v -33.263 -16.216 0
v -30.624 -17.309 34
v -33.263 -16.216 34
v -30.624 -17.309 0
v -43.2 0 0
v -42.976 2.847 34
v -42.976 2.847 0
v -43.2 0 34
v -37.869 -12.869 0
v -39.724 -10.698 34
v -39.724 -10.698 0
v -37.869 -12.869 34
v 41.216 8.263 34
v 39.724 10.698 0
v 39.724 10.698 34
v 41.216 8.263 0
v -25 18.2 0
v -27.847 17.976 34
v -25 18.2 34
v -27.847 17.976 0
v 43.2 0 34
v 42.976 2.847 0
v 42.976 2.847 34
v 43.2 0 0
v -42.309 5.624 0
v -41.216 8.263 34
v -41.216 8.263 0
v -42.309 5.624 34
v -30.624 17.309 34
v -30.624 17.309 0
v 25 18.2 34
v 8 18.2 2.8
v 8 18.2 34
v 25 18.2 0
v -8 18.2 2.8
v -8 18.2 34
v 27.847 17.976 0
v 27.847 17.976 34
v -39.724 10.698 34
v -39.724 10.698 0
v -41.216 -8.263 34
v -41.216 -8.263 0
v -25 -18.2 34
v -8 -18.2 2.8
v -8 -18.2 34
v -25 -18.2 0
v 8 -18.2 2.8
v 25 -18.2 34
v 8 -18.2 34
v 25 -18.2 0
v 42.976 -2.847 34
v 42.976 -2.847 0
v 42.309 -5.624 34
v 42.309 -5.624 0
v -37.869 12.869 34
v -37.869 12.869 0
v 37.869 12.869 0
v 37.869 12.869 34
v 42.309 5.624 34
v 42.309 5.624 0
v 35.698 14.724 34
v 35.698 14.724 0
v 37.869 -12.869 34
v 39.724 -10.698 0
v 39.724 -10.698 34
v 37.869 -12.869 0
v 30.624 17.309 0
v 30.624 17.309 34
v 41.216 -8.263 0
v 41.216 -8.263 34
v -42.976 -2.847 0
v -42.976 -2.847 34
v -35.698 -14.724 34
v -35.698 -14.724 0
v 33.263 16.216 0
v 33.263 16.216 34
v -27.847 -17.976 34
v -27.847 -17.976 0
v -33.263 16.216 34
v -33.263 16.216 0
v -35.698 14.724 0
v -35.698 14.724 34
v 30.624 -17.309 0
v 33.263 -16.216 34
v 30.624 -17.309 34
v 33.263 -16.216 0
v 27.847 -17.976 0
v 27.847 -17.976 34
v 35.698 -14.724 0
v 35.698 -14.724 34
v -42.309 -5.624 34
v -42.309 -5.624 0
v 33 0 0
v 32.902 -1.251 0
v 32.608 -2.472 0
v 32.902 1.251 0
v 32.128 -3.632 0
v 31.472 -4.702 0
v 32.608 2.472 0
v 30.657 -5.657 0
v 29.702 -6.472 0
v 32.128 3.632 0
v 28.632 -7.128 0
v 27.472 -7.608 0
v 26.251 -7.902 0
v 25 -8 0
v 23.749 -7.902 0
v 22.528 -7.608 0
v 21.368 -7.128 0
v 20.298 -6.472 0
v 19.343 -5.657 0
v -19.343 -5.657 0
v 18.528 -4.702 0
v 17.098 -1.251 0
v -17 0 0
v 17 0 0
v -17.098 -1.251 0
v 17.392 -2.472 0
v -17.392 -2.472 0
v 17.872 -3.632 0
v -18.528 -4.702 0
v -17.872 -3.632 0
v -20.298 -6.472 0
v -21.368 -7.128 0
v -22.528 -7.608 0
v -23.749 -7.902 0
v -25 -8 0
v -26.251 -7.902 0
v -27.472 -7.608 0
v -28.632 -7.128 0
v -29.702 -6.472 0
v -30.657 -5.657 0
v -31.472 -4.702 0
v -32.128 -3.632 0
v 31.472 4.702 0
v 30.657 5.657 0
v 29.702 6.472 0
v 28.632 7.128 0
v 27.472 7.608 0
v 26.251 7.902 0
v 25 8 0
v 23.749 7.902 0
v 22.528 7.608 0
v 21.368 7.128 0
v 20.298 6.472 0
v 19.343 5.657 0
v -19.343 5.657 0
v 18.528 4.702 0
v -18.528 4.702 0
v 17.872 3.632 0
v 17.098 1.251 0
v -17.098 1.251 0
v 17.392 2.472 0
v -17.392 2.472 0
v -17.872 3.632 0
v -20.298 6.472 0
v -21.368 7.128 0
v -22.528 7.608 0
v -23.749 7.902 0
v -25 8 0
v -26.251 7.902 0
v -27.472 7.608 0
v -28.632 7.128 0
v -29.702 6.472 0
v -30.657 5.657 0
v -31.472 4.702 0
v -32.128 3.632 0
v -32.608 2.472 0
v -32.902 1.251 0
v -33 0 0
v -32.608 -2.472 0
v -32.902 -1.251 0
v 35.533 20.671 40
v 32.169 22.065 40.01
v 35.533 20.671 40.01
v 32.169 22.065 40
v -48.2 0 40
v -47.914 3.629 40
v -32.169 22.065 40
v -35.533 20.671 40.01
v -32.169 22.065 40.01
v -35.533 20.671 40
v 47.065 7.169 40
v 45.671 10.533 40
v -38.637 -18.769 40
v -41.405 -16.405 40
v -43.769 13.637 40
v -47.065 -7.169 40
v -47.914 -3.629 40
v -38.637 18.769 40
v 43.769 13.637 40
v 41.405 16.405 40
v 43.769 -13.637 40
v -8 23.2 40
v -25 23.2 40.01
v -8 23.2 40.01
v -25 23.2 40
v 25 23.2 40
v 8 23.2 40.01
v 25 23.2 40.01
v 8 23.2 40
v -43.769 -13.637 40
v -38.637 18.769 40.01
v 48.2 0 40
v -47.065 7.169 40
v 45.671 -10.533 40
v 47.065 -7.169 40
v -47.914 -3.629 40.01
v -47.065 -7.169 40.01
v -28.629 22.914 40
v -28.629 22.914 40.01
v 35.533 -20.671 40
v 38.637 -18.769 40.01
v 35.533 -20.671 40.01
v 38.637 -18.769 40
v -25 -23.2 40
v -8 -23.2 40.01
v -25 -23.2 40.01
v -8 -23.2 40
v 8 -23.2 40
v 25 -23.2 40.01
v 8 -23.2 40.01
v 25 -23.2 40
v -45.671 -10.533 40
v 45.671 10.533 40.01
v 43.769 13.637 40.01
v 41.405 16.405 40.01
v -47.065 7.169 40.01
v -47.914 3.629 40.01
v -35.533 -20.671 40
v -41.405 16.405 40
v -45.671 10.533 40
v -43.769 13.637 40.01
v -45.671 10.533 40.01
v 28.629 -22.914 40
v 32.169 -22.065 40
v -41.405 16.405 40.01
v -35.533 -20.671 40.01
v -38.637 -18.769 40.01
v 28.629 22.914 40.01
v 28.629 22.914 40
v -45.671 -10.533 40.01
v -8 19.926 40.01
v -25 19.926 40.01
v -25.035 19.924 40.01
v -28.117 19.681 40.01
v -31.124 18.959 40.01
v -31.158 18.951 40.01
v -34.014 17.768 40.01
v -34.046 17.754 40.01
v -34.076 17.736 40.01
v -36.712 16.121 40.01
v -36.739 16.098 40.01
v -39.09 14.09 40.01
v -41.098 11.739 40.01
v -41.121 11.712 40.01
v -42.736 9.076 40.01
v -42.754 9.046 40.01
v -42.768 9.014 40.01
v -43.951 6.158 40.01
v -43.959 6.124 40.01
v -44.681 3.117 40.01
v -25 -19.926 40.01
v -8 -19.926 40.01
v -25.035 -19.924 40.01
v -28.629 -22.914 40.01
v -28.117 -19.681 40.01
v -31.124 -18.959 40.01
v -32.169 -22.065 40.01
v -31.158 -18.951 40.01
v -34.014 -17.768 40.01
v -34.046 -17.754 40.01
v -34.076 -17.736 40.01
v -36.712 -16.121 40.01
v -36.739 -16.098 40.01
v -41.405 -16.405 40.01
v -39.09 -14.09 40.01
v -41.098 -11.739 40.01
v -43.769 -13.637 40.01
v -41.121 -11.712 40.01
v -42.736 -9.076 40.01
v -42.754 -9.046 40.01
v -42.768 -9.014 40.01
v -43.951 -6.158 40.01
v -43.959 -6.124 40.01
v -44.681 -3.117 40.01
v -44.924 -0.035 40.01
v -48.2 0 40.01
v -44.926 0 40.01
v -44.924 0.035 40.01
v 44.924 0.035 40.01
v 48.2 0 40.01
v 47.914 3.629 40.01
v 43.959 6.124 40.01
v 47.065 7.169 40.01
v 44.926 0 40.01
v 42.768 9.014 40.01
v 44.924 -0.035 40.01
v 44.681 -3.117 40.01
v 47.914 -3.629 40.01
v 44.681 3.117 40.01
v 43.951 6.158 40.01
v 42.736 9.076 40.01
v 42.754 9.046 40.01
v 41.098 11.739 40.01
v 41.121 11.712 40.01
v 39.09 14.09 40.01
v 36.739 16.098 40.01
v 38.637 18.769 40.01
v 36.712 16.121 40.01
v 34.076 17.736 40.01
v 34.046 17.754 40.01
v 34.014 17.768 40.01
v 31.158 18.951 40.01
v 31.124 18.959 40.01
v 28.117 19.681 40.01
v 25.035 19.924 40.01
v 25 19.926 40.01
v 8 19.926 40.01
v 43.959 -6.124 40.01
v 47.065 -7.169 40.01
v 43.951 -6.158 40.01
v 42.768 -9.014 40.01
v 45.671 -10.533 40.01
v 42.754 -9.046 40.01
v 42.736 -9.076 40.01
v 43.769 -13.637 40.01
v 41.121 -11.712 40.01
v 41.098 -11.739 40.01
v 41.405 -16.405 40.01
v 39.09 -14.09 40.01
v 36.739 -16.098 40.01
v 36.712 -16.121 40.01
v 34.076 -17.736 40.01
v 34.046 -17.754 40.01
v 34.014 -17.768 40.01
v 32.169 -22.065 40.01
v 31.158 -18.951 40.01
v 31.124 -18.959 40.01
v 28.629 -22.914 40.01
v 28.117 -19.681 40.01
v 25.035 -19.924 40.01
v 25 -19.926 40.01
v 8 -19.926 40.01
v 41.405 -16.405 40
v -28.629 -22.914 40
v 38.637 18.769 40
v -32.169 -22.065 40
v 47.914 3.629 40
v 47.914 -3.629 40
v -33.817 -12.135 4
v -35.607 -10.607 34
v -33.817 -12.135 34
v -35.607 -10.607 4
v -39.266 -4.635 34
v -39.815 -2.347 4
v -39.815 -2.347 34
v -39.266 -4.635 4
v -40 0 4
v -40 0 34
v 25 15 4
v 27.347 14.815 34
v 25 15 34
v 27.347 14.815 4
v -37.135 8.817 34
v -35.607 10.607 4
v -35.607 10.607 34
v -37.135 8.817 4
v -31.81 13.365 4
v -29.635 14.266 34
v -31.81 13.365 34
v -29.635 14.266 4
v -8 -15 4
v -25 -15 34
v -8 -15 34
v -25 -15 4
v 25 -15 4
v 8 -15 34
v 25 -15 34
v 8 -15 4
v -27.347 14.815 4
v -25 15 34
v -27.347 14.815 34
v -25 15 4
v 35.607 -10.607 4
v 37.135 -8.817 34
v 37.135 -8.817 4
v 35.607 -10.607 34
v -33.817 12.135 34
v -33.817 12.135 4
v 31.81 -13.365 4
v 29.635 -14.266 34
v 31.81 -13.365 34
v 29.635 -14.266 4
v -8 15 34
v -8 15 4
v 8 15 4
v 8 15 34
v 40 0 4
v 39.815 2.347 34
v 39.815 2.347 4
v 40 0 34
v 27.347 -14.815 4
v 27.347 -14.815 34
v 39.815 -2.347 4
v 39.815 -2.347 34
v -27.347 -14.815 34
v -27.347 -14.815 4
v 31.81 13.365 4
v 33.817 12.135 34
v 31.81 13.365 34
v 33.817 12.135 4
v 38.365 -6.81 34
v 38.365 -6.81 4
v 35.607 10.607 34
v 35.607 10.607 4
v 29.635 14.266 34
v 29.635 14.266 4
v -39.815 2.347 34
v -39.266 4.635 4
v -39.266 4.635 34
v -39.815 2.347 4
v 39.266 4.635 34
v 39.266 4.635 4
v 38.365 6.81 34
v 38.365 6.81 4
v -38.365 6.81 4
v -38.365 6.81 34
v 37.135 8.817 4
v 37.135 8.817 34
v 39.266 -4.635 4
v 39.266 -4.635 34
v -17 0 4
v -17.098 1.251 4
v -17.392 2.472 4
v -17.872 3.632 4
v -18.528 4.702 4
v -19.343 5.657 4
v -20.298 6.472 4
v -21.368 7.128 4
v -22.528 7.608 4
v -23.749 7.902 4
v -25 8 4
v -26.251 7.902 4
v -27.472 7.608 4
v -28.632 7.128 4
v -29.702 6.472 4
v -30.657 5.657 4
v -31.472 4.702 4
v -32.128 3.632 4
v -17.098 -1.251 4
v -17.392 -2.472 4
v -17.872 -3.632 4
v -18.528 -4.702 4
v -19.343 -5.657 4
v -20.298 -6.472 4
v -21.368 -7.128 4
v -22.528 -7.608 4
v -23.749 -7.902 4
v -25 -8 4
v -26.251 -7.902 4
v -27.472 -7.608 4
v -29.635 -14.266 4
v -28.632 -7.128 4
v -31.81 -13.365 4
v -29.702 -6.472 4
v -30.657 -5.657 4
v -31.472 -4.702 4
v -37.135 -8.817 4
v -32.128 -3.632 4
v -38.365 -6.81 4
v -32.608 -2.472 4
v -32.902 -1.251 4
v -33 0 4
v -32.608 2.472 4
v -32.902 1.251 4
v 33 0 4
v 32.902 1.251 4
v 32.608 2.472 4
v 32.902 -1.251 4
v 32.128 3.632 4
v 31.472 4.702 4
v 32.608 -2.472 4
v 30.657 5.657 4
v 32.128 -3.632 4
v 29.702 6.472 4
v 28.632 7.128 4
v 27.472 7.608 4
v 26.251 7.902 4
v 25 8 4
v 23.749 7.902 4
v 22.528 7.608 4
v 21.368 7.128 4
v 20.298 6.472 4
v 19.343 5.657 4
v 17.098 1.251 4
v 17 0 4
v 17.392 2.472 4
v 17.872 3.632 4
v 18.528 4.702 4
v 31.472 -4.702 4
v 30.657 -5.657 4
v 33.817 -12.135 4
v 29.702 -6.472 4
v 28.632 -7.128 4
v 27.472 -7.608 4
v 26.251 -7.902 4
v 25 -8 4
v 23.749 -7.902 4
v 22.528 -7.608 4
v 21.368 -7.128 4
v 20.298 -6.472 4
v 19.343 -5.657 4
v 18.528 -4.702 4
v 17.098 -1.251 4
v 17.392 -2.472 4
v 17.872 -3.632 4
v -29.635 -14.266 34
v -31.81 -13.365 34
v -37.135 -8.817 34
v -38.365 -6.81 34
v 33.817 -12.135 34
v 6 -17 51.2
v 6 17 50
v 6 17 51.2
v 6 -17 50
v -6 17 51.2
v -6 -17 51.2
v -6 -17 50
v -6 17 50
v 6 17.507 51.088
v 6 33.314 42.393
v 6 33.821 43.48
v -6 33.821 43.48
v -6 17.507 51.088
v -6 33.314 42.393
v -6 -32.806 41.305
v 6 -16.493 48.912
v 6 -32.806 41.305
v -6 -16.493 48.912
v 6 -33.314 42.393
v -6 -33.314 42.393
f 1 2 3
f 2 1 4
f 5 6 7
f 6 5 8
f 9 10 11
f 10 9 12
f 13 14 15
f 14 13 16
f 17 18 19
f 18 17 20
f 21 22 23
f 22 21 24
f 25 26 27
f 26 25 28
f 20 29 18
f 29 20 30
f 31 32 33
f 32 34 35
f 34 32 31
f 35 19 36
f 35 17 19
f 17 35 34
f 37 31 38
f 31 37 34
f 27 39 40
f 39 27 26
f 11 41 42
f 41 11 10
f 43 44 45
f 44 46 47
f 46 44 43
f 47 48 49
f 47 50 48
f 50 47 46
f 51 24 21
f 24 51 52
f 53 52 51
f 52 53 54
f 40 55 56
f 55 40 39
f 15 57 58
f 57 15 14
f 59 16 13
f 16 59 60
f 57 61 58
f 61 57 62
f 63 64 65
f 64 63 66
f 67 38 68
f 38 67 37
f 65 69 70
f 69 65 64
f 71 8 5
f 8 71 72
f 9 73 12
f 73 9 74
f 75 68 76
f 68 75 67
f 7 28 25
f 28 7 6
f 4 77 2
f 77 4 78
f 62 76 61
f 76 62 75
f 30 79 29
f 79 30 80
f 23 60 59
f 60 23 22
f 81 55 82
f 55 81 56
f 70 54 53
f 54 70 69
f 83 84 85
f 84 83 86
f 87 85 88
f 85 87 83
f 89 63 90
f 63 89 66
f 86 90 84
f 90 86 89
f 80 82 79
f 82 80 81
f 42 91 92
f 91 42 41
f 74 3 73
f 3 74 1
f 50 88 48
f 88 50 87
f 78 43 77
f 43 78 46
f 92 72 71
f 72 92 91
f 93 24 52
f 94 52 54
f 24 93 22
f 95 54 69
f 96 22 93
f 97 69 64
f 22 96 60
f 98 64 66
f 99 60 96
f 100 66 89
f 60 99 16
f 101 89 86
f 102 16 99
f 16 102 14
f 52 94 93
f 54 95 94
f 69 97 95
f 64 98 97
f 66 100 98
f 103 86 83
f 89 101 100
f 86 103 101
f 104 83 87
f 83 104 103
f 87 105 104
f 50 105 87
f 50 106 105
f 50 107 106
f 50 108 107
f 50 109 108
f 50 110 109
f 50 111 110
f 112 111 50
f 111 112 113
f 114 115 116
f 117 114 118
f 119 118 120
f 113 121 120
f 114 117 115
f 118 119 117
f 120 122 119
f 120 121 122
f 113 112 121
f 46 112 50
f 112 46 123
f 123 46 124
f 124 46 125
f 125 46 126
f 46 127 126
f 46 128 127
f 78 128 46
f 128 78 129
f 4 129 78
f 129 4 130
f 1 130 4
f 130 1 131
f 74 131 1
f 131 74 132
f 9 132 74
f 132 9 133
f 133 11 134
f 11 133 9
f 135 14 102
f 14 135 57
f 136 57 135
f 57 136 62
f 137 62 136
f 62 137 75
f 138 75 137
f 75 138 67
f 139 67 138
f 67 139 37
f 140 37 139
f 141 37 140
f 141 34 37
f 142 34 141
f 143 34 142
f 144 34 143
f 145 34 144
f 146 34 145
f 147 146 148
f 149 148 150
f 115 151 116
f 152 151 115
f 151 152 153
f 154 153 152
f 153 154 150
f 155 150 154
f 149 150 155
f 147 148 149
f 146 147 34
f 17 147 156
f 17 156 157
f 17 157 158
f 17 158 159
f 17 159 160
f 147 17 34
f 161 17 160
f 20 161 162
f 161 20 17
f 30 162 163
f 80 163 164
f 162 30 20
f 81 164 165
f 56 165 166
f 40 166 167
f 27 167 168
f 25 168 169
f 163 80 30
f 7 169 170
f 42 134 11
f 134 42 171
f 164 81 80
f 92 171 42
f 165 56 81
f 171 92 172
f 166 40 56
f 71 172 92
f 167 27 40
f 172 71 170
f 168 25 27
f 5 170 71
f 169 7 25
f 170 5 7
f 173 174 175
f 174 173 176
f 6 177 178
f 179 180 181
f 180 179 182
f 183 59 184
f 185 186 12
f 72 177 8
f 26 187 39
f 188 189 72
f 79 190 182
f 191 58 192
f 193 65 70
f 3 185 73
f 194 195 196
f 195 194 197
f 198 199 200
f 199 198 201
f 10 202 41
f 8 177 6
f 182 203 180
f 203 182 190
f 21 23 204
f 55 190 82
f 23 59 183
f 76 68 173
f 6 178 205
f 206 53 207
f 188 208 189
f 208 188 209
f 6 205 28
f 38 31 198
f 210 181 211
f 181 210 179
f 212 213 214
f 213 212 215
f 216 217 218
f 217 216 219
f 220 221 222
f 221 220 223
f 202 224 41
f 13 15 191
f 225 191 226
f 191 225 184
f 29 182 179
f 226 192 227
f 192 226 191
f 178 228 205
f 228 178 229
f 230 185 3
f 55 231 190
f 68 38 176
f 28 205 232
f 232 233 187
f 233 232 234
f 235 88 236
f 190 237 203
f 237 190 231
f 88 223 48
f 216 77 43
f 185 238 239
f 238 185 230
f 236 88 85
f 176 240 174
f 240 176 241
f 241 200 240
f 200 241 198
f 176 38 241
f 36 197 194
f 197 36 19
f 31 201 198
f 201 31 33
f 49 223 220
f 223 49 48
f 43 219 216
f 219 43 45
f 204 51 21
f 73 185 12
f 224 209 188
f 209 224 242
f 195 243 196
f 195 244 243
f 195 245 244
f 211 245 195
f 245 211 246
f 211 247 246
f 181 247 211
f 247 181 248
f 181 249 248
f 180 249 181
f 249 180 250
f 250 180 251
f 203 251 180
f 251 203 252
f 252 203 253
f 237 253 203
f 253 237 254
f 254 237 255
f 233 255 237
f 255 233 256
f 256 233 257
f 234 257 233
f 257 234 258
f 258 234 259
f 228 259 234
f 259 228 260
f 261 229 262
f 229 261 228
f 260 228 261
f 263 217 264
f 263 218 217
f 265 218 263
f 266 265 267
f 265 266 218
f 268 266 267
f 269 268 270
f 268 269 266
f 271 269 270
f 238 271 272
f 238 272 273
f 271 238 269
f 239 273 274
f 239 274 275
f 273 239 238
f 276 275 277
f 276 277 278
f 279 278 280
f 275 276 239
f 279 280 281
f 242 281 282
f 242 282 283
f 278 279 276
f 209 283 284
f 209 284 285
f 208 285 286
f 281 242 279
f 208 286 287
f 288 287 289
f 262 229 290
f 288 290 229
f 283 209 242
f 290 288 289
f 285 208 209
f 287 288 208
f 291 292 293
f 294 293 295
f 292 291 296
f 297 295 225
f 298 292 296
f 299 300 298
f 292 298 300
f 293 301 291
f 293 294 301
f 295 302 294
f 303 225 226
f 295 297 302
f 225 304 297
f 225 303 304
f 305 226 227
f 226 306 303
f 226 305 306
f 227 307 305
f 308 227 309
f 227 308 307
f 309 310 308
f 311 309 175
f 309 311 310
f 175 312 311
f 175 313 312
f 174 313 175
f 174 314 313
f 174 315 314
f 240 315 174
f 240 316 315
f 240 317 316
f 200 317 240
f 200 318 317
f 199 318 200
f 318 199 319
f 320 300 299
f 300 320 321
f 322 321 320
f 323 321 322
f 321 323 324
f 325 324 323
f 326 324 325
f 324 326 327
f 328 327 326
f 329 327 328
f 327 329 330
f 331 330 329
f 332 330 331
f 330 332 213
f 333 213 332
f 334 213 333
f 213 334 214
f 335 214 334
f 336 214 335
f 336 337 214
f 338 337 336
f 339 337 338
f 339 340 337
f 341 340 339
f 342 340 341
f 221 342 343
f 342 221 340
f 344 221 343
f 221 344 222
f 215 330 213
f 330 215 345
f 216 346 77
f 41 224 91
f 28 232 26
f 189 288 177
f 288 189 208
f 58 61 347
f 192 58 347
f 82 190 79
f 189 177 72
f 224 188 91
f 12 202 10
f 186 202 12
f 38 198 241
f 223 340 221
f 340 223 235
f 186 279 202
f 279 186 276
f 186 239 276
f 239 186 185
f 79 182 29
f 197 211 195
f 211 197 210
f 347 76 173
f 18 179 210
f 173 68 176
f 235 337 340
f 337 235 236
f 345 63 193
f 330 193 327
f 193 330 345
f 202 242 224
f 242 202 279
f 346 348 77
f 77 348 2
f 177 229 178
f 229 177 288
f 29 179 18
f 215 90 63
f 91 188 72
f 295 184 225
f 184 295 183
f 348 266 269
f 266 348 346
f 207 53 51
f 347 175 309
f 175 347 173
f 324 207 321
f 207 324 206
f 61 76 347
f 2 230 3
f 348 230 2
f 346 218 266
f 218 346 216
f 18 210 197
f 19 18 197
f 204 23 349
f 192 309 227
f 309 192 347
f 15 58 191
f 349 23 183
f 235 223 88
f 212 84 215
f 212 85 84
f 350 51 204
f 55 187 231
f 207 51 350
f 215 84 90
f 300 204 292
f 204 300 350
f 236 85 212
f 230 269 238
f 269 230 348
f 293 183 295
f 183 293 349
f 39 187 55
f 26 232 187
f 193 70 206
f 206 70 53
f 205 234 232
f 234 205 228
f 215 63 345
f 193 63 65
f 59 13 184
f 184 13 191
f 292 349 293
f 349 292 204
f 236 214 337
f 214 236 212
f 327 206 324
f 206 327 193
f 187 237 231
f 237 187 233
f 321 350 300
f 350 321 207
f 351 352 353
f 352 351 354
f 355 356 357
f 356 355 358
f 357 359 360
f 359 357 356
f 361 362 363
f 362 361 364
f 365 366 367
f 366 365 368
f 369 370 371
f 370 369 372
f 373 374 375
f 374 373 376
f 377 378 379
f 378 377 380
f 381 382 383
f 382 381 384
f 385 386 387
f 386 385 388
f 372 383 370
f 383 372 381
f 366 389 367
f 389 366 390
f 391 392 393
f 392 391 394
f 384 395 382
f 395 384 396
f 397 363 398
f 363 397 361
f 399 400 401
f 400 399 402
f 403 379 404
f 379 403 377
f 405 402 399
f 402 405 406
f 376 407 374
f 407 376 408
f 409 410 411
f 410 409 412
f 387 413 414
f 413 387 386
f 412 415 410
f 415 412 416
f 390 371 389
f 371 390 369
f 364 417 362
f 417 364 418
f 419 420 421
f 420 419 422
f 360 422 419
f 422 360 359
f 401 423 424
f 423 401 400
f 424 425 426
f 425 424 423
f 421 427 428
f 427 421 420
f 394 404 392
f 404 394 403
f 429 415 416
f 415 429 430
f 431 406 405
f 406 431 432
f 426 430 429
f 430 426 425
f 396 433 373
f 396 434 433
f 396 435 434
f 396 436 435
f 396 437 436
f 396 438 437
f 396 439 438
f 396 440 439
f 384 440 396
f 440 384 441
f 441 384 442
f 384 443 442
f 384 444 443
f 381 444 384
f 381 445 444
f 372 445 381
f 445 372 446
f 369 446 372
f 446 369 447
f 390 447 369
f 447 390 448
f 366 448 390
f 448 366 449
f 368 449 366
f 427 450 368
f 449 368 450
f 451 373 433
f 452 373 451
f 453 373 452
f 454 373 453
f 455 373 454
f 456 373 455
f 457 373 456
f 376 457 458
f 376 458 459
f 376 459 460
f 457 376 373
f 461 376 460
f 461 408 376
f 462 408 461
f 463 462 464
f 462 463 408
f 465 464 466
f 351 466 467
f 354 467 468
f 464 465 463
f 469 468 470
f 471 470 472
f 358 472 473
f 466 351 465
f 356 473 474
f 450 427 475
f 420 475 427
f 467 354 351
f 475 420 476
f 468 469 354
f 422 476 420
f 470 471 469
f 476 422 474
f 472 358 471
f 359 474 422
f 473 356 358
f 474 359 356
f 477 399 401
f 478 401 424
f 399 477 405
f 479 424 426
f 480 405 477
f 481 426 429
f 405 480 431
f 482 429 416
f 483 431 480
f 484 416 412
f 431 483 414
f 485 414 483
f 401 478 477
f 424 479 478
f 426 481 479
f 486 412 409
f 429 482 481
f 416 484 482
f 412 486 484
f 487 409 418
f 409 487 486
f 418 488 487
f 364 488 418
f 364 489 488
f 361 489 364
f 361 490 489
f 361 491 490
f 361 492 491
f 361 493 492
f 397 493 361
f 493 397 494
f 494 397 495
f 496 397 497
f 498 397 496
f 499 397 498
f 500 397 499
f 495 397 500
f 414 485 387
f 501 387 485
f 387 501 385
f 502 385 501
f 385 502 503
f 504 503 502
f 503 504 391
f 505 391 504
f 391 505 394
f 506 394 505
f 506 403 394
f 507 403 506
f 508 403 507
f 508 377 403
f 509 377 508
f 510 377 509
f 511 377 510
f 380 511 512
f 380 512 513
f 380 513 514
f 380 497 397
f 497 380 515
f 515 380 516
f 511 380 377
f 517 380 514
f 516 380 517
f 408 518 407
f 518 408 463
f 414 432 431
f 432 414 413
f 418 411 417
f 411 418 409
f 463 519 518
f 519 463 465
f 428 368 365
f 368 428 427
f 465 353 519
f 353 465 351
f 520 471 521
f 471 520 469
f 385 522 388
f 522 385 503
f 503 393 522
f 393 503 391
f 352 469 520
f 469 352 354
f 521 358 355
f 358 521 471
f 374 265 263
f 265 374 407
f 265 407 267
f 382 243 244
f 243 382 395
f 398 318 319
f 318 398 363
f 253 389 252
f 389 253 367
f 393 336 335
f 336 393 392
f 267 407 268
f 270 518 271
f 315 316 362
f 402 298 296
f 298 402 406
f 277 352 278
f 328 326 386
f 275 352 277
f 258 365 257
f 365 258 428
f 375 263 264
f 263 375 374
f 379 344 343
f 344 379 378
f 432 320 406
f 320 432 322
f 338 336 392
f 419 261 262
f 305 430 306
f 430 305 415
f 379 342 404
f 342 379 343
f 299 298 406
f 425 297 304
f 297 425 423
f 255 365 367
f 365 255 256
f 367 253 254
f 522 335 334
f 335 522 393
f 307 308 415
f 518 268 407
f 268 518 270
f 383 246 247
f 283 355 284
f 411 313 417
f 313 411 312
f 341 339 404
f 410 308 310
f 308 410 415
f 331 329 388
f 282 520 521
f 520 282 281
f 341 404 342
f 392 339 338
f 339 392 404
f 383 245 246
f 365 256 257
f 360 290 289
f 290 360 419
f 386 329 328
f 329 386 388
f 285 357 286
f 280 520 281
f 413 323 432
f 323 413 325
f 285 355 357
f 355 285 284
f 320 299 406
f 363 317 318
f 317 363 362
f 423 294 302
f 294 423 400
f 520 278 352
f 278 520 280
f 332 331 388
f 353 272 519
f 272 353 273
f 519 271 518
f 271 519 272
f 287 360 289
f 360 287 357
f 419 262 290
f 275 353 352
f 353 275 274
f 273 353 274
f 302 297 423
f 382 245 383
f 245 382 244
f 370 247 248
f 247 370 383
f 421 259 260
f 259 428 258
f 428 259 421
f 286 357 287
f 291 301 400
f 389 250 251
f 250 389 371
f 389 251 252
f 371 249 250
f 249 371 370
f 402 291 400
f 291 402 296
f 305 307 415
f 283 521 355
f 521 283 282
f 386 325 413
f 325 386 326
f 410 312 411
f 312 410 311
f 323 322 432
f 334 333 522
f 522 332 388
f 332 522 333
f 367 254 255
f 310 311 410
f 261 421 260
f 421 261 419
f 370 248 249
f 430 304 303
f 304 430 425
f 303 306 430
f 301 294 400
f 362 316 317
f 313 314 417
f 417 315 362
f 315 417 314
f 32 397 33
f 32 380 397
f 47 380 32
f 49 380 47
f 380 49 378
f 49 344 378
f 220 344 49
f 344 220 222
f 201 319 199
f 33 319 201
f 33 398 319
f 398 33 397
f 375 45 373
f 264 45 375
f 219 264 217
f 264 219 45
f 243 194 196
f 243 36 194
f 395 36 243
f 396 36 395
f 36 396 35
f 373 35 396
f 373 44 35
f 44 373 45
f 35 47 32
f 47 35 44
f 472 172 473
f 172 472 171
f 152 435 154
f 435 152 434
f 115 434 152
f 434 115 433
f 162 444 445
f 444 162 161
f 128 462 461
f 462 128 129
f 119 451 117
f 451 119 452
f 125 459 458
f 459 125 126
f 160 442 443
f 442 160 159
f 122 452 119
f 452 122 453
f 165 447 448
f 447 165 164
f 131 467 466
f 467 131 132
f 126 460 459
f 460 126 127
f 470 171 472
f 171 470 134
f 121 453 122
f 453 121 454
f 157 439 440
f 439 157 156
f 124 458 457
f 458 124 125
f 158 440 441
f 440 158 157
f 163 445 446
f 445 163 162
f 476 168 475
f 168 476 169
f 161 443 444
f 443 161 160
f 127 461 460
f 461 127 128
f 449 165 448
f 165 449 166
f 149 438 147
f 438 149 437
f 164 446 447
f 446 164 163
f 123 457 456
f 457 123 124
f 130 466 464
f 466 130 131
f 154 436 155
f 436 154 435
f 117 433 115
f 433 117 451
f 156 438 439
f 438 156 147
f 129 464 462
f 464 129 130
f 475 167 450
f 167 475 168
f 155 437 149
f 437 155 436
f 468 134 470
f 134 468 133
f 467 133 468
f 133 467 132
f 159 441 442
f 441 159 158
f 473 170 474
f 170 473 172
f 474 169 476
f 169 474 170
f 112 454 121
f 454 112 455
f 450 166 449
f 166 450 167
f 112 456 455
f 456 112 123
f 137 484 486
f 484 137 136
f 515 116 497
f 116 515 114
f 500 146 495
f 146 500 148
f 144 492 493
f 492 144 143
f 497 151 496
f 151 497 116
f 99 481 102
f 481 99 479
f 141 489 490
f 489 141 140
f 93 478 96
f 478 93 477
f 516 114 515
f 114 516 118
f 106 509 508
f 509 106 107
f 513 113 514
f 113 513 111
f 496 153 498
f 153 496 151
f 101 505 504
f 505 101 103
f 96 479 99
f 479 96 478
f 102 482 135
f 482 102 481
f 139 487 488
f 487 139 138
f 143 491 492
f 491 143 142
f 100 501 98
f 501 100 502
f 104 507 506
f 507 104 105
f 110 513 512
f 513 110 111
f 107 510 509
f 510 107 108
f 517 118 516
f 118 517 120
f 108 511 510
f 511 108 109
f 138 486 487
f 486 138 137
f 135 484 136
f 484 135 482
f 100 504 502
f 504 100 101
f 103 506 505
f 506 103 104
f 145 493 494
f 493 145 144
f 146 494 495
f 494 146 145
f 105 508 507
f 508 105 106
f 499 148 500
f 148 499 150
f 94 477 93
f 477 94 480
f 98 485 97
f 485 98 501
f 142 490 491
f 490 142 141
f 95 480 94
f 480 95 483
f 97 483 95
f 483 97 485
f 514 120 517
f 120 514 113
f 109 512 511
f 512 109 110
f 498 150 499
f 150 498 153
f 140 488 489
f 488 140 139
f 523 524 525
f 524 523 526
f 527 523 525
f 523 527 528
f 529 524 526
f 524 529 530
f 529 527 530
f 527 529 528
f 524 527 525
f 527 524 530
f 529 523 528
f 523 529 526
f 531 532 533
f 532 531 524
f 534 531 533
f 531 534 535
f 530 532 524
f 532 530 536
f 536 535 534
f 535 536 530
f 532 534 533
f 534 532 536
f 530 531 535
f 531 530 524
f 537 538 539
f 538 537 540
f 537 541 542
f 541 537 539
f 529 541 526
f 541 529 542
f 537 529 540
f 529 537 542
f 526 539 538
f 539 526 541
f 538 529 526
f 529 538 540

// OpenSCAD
// =============================================================================
// ANIMATION SCENE FOR CABLE JIG USAGE DEMO
// =============================================================================
// Rendered at specific progress values 't_val' from 0.0 to 5.0

t_val = 0.0; // [0.0 : 0.1 : 5.0]

$fn = 40;

// Dimensions for Size S Jig
jig_len = 80;
jig_wid = 30;
jig_dep = 30;
wall    = 3.2;
base_h  = 4.0;
recess  = 1.2;
slot_w  = 16.0;
flare_h = 6.0;
flare_e = 5.0;

module 2d_stadium(length, width) {
    if (length <= width) {
        circle(d = width);
    } else {
        dx = (length - width) / 2;
        hull() {
            translate([-dx, 0]) circle(d = width);
            translate([ dx, 0]) circle(d = width);
        }
    }
}

// -----------------------------------------------------------------------------
// JIG BODY (Semi-transparent cyan for clear internal visibility)
// -----------------------------------------------------------------------------
module jig() {
    outer_l = jig_len + 2 * wall;
    outer_w = jig_wid + 2 * wall;
    flared_outer_l = outer_l + 2 * flare_e;
    flared_outer_w = outer_w + 2 * flare_e;
    flared_inner_l = jig_len + 2 * flare_e;
    flared_inner_w = jig_wid + 2 * flare_e;
    total_h = base_h + jig_dep + flare_h;
    dx = (jig_len - jig_wid) / 2;

    color([0.15, 0.55, 0.85, 0.50]) {
        difference() {
            union() {
                linear_extrude(base_h + jig_dep) 2d_stadium(outer_l, outer_w);
                translate([0, 0, base_h + jig_dep]) hull() {
                    linear_extrude(0.01) 2d_stadium(outer_l, outer_w);
                    translate([0, 0, flare_h]) linear_extrude(0.01) 2d_stadium(flared_outer_l, flared_outer_w);
                }
            }
            // Inner cavity
            translate([0, 0, base_h]) linear_extrude(jig_dep + 0.05) 2d_stadium(jig_len, jig_wid);
            translate([0, 0, base_h + jig_dep]) hull() {
                linear_extrude(0.01) 2d_stadium(jig_len, jig_wid);
                translate([0, 0, flare_h + 0.1]) linear_extrude(0.01) 2d_stadium(flared_inner_l, flared_inner_w);
            }
            // Side slots
            translate([-slot_w / 2, -(flared_outer_w + 10) / 2, base_h])
                cube([slot_w, flared_outer_w + 10, total_h + 10]);
            // Floor recess
            translate([-slot_w / 2, -(outer_w + 4) / 2, base_h - recess])
                cube([slot_w, outer_w + 4, recess + 0.05]);
            // Ejection holes
            translate([-dx, 0, -1]) cylinder(d = 16, h = base_h + 2);
            translate([ dx, 0, -1]) cylinder(d = 16, h = base_h + 2);
        }
    }
}

// -----------------------------------------------------------------------------
// CABLE COIL / BUNDLE
// -----------------------------------------------------------------------------
module wire_stadium(l, w, wire_r=1.8) {
    if (l <= w) {
        rotate_extrude() translate([w / 2 - wire_r, 0, 0]) circle(r = wire_r);
    } else {
        dx = (l - w) / 2;
        dy = w / 2 - wire_r;
        translate([-dx,  dy, 0]) rotate([0, 90, 0]) cylinder(r = wire_r, h = 2 * dx);
        translate([-dx, -dy, 0]) rotate([0, 90, 0]) cylinder(r = wire_r, h = 2 * dx);
        translate([ dx, 0, 0]) rotate([0, 0, -90]) rotate_extrude(angle = 180) translate([dy, 0, 0]) circle(r = wire_r);
        translate([-dx, 0, 0]) rotate([0, 0,  90]) rotate_extrude(angle = 180) translate([dy, 0, 0]) circle(r = wire_r);
    }
}

module cable_bundle(l, w) {
    color([0.18, 0.20, 0.24]) {
        for (dz = [-5, 0, 5]) {
            for (dw = [-2.5, 2.5]) {
                translate([0, 0, dz]) wire_stadium(max(w + dw, l + dw), w + dw, wire_r = 1.6);
            }
        }
    }
}

// -----------------------------------------------------------------------------
// VELCRO STRAP
// -----------------------------------------------------------------------------
module strap_open(z_pos) {
    // Open strap resting or descending into slot
    color([0.95, 0.25, 0.22]) {
        // Floor section
        translate([-6, -17, z_pos]) cube([12, 34, 1.2]);
        // Left wing angled out
        translate([-6, 17, z_pos]) rotate([-25, 0, 0]) cube([12, 18, 1.2]);
        // Right wing angled out
        translate([-6, -17, z_pos]) rotate([205, 0, 0]) cube([12, 18, 1.2]);
    }
}

module strap_cinched(z_pos, wrap_phase=1.0) {
    color([0.95, 0.25, 0.22]) {
        // Floor section
        translate([-6, -15, z_pos]) cube([12, 30, 1.2]);
        // Sidewall verticals
        translate([-6, 14, z_pos]) cube([12, 1.2, 18]);
        translate([-6, -15.2, z_pos]) cube([12, 1.2, 18]);
        // Top flaps folding over
        top_fold = min(1.0, wrap_phase);
        translate([-6, 15, z_pos + 18]) rotate([0, 0, 0]) cube([12, 1.2, 0.1]);
        // Left top flap
        translate([-6, 15 - 15 * top_fold, z_pos + 17.5]) cube([12, 15 * top_fold, 1.2]);
        // Right top flap overlapping
        translate([-6, -15, z_pos + 18.2]) cube([12, 16 * top_fold, 1.2]);
    }
}

// -----------------------------------------------------------------------------
// UPWARD EJECTION ARROWS
// -----------------------------------------------------------------------------
module ejection_arrows(alpha=1.0) {
    dx = (jig_len - jig_wid) / 2;
    color([0.2, 0.85, 0.3, alpha]) {
        for (side = [-dx, dx]) {
            translate([side, 0, -18]) {
                cylinder(r = 2.5, h = 12);
                translate([0, 0, 12]) cylinder(r1 = 5.0, r2 = 0.5, h = 6);
            }
        }
    }
}

// -----------------------------------------------------------------------------
// ANIMATION TIMELINE LOGIC
// -----------------------------------------------------------------------------
jig();

// STAGE 1: Strap drops into jig (t_val: 0.0 -> 1.0)
if (t_val <= 1.0) {
    s_t = t_val; // 0 -> 1
    strap_z = 50 - 46.5 * s_t;
    strap_open(strap_z);
}

// STAGE 2: Strap rests at bottom, round cable coil approaches (t_val: 1.0 -> 2.0)
else if (t_val <= 2.0) {
    s_t = t_val - 1.0; // 0 -> 1
    strap_open(3.5);
    cable_z = 65 - 28 * s_t;
    translate([0, 0, cable_z]) cable_bundle(58, 58);
}

// STAGE 3: Cable enters funnel, squashes into oblong against stopper (t_val: 2.0 -> 3.0)
else if (t_val <= 3.0) {
    s_t = t_val - 2.0; // 0 -> 1
    strap_open(3.5);
    cable_z = 37 - 24 * s_t;
    // Morph from circular (58x58) to oblong (74x24)
    cur_len = 58 + (74 - 58) * s_t;
    cur_wid = 58 + (24 - 58) * s_t;
    translate([0, 0, cable_z]) cable_bundle(cur_len, cur_wid);
}

// STAGE 4: Cable at bottom, strap folds and cinches around waist (t_val: 3.0 -> 4.0)
else if (t_val <= 4.0) {
    s_t = t_val - 3.0; // 0 -> 1
    translate([0, 0, 13]) cable_bundle(74, 24);
    strap_cinched(3.5, wrap_phase = s_t);
}

// STAGE 5: Ejection! Upward arrows push strapped bundle out (t_val: 4.0 -> 5.0)
else {
    s_t = min(1.0, t_val - 4.0); // 0 -> 1
    eject_z = 13 + 52 * s_t;
    translate([0, 0, eject_z]) {
        cable_bundle(74, 24);
        strap_cinched(-9.0, wrap_phase = 1.0);
    }
    ejection_arrows(alpha = 0.9);
}
